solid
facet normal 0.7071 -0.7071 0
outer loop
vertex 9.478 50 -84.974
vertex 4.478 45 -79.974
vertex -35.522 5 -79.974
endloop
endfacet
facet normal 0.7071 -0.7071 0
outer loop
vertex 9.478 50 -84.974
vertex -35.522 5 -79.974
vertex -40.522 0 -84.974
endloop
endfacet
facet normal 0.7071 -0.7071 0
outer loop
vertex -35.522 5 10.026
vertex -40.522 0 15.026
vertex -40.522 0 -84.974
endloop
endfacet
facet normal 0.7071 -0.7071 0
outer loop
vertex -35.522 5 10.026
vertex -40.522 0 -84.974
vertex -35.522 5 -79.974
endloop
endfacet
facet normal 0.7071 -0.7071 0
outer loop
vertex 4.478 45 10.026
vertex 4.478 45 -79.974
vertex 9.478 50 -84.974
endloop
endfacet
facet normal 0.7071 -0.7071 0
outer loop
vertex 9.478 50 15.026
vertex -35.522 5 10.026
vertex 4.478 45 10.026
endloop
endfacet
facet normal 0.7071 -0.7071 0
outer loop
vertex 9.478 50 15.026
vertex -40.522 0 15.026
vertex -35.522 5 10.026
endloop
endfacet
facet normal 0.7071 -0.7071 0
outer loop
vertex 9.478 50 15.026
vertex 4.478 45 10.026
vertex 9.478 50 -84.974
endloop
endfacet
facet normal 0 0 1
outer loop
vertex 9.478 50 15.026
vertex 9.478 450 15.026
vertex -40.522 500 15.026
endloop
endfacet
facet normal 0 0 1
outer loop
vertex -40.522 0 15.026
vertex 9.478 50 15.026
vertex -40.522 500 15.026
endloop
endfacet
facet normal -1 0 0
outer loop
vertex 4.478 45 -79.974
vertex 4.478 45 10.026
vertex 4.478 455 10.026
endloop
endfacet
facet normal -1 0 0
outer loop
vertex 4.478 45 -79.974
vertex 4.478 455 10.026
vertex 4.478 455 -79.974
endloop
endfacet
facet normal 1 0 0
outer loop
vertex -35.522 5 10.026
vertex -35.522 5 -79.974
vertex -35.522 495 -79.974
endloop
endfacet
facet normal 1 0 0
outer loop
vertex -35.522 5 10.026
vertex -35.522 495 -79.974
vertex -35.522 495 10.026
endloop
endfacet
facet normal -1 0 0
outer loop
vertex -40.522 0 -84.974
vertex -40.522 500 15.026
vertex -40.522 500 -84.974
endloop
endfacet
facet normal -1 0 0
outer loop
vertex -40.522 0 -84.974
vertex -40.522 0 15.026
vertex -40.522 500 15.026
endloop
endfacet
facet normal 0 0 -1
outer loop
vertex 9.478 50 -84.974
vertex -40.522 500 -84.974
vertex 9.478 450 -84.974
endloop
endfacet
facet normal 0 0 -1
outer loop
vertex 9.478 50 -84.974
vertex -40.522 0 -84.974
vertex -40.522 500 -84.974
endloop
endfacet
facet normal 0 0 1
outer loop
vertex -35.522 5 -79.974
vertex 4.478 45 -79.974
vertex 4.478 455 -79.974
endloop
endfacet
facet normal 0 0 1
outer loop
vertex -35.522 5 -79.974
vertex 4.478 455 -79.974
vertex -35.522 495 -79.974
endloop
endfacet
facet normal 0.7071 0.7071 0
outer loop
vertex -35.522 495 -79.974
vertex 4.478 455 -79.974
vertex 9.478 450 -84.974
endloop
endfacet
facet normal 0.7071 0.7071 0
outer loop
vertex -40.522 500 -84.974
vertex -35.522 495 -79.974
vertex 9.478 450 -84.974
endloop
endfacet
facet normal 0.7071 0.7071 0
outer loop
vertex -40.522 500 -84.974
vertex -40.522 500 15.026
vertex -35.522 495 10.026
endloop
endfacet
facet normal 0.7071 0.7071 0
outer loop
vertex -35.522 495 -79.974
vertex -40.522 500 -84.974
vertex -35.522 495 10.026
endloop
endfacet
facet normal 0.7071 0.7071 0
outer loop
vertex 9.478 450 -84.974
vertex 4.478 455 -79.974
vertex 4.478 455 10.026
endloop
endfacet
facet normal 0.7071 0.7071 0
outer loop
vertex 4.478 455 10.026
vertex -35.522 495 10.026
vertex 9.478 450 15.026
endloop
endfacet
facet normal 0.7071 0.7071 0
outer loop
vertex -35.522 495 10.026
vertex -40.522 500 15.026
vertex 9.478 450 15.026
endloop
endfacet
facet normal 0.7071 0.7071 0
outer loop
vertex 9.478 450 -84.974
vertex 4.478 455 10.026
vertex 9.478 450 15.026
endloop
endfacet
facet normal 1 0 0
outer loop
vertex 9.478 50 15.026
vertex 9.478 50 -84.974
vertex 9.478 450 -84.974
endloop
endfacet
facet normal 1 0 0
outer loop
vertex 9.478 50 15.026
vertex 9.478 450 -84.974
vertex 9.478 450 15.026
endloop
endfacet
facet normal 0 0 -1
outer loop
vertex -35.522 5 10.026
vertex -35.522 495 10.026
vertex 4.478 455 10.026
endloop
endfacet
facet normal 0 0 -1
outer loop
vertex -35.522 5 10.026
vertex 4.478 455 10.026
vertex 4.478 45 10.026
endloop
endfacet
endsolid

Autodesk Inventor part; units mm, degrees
ref_plane "YZ Plane" through (0, 0, 0) normal (1, 0, 0) x (0, 1, 0)
ref_plane "XZ Plane" through (0, 0, 0) normal (0, 1, 0) x (-1, 0, 0)
ref_plane "XY Plane" through (0, 0, 0) normal (0, 0, 1) x (1, 0, 0)
sketch "Sketch1" plane through (0, 0, 0) normal (0, 1, 0) x (-1, 0, 0)
  line L0 (-9.4777, 15.0257) -> (40.5223, 15.0257)
  line L1 (40.5223, 15.0257) -> (40.5223, -84.9743)
  line L2 (40.5223, -84.9743) -> (-9.4777, -84.9743)
  line L3 (-9.4777, -84.9743) -> (-9.4777, 15.0257)
  line L4 (35.5223, 10.0257) -> (-4.4777, 10.0257)
  line L5 (-4.4777, 10.0257) -> (-4.4777, -79.9743)
  line L6 (-4.4777, -79.9743) -> (35.5223, -79.9743)
  line L7 (35.5223, -79.9743) -> (35.5223, 10.0257)
  point P0 (0, 0)
  point P1 (0, 0)
  dimension "d0" = 50
  dimension "d1" = 100
  dimension "d2" = 5
  dimension "d3" = 90
  dimension "d4" = 5
  dimension "d5" = 40
extrude "Extrusion1" add sketch "Sketch1" along normal blind 500
sketch "Sketch2" plane through (-40.5223, 0, 15.0257) normal (0, 0, 1) x (1, 0, 0)
  line L0 (0, 0) -> (50, 0) projected
  line L1 (0, 0) -> (70.7251, 0) construction
  line L2 (45, 0) -> (45, 500) projected
  line L3 (0, 0) -> (50, 50)
  line L4 (50, 0) -> (50, 500) projected
  line L5 (0, 0) -> (70.7107, 0) construction
  line L6 (50, 50) -> (50, 0)
  line L7 (50, 0) -> (0, 0)
  line L8 (0, 0) -> (0, 500) projected
  line L9 (0, 500) -> (50, 450)
  line L10 (0, 500) -> (70.7107, 500) construction
  line L11 (50, 450) -> (50, 500)
  line L12 (50, 500) -> (0, 500)
  point P0 (40.5223, 0)
  dimension "d9" = 45
  dimension "d10" = 45
extrude "Extrusion2" cut sketch "Sketch2" against normal blind 500 contours L3 L2 L0 | L2 L3 L4 L0 | L12 L2 L9 | L2 L12 L4 L9
properties part number "PerfilD2"
